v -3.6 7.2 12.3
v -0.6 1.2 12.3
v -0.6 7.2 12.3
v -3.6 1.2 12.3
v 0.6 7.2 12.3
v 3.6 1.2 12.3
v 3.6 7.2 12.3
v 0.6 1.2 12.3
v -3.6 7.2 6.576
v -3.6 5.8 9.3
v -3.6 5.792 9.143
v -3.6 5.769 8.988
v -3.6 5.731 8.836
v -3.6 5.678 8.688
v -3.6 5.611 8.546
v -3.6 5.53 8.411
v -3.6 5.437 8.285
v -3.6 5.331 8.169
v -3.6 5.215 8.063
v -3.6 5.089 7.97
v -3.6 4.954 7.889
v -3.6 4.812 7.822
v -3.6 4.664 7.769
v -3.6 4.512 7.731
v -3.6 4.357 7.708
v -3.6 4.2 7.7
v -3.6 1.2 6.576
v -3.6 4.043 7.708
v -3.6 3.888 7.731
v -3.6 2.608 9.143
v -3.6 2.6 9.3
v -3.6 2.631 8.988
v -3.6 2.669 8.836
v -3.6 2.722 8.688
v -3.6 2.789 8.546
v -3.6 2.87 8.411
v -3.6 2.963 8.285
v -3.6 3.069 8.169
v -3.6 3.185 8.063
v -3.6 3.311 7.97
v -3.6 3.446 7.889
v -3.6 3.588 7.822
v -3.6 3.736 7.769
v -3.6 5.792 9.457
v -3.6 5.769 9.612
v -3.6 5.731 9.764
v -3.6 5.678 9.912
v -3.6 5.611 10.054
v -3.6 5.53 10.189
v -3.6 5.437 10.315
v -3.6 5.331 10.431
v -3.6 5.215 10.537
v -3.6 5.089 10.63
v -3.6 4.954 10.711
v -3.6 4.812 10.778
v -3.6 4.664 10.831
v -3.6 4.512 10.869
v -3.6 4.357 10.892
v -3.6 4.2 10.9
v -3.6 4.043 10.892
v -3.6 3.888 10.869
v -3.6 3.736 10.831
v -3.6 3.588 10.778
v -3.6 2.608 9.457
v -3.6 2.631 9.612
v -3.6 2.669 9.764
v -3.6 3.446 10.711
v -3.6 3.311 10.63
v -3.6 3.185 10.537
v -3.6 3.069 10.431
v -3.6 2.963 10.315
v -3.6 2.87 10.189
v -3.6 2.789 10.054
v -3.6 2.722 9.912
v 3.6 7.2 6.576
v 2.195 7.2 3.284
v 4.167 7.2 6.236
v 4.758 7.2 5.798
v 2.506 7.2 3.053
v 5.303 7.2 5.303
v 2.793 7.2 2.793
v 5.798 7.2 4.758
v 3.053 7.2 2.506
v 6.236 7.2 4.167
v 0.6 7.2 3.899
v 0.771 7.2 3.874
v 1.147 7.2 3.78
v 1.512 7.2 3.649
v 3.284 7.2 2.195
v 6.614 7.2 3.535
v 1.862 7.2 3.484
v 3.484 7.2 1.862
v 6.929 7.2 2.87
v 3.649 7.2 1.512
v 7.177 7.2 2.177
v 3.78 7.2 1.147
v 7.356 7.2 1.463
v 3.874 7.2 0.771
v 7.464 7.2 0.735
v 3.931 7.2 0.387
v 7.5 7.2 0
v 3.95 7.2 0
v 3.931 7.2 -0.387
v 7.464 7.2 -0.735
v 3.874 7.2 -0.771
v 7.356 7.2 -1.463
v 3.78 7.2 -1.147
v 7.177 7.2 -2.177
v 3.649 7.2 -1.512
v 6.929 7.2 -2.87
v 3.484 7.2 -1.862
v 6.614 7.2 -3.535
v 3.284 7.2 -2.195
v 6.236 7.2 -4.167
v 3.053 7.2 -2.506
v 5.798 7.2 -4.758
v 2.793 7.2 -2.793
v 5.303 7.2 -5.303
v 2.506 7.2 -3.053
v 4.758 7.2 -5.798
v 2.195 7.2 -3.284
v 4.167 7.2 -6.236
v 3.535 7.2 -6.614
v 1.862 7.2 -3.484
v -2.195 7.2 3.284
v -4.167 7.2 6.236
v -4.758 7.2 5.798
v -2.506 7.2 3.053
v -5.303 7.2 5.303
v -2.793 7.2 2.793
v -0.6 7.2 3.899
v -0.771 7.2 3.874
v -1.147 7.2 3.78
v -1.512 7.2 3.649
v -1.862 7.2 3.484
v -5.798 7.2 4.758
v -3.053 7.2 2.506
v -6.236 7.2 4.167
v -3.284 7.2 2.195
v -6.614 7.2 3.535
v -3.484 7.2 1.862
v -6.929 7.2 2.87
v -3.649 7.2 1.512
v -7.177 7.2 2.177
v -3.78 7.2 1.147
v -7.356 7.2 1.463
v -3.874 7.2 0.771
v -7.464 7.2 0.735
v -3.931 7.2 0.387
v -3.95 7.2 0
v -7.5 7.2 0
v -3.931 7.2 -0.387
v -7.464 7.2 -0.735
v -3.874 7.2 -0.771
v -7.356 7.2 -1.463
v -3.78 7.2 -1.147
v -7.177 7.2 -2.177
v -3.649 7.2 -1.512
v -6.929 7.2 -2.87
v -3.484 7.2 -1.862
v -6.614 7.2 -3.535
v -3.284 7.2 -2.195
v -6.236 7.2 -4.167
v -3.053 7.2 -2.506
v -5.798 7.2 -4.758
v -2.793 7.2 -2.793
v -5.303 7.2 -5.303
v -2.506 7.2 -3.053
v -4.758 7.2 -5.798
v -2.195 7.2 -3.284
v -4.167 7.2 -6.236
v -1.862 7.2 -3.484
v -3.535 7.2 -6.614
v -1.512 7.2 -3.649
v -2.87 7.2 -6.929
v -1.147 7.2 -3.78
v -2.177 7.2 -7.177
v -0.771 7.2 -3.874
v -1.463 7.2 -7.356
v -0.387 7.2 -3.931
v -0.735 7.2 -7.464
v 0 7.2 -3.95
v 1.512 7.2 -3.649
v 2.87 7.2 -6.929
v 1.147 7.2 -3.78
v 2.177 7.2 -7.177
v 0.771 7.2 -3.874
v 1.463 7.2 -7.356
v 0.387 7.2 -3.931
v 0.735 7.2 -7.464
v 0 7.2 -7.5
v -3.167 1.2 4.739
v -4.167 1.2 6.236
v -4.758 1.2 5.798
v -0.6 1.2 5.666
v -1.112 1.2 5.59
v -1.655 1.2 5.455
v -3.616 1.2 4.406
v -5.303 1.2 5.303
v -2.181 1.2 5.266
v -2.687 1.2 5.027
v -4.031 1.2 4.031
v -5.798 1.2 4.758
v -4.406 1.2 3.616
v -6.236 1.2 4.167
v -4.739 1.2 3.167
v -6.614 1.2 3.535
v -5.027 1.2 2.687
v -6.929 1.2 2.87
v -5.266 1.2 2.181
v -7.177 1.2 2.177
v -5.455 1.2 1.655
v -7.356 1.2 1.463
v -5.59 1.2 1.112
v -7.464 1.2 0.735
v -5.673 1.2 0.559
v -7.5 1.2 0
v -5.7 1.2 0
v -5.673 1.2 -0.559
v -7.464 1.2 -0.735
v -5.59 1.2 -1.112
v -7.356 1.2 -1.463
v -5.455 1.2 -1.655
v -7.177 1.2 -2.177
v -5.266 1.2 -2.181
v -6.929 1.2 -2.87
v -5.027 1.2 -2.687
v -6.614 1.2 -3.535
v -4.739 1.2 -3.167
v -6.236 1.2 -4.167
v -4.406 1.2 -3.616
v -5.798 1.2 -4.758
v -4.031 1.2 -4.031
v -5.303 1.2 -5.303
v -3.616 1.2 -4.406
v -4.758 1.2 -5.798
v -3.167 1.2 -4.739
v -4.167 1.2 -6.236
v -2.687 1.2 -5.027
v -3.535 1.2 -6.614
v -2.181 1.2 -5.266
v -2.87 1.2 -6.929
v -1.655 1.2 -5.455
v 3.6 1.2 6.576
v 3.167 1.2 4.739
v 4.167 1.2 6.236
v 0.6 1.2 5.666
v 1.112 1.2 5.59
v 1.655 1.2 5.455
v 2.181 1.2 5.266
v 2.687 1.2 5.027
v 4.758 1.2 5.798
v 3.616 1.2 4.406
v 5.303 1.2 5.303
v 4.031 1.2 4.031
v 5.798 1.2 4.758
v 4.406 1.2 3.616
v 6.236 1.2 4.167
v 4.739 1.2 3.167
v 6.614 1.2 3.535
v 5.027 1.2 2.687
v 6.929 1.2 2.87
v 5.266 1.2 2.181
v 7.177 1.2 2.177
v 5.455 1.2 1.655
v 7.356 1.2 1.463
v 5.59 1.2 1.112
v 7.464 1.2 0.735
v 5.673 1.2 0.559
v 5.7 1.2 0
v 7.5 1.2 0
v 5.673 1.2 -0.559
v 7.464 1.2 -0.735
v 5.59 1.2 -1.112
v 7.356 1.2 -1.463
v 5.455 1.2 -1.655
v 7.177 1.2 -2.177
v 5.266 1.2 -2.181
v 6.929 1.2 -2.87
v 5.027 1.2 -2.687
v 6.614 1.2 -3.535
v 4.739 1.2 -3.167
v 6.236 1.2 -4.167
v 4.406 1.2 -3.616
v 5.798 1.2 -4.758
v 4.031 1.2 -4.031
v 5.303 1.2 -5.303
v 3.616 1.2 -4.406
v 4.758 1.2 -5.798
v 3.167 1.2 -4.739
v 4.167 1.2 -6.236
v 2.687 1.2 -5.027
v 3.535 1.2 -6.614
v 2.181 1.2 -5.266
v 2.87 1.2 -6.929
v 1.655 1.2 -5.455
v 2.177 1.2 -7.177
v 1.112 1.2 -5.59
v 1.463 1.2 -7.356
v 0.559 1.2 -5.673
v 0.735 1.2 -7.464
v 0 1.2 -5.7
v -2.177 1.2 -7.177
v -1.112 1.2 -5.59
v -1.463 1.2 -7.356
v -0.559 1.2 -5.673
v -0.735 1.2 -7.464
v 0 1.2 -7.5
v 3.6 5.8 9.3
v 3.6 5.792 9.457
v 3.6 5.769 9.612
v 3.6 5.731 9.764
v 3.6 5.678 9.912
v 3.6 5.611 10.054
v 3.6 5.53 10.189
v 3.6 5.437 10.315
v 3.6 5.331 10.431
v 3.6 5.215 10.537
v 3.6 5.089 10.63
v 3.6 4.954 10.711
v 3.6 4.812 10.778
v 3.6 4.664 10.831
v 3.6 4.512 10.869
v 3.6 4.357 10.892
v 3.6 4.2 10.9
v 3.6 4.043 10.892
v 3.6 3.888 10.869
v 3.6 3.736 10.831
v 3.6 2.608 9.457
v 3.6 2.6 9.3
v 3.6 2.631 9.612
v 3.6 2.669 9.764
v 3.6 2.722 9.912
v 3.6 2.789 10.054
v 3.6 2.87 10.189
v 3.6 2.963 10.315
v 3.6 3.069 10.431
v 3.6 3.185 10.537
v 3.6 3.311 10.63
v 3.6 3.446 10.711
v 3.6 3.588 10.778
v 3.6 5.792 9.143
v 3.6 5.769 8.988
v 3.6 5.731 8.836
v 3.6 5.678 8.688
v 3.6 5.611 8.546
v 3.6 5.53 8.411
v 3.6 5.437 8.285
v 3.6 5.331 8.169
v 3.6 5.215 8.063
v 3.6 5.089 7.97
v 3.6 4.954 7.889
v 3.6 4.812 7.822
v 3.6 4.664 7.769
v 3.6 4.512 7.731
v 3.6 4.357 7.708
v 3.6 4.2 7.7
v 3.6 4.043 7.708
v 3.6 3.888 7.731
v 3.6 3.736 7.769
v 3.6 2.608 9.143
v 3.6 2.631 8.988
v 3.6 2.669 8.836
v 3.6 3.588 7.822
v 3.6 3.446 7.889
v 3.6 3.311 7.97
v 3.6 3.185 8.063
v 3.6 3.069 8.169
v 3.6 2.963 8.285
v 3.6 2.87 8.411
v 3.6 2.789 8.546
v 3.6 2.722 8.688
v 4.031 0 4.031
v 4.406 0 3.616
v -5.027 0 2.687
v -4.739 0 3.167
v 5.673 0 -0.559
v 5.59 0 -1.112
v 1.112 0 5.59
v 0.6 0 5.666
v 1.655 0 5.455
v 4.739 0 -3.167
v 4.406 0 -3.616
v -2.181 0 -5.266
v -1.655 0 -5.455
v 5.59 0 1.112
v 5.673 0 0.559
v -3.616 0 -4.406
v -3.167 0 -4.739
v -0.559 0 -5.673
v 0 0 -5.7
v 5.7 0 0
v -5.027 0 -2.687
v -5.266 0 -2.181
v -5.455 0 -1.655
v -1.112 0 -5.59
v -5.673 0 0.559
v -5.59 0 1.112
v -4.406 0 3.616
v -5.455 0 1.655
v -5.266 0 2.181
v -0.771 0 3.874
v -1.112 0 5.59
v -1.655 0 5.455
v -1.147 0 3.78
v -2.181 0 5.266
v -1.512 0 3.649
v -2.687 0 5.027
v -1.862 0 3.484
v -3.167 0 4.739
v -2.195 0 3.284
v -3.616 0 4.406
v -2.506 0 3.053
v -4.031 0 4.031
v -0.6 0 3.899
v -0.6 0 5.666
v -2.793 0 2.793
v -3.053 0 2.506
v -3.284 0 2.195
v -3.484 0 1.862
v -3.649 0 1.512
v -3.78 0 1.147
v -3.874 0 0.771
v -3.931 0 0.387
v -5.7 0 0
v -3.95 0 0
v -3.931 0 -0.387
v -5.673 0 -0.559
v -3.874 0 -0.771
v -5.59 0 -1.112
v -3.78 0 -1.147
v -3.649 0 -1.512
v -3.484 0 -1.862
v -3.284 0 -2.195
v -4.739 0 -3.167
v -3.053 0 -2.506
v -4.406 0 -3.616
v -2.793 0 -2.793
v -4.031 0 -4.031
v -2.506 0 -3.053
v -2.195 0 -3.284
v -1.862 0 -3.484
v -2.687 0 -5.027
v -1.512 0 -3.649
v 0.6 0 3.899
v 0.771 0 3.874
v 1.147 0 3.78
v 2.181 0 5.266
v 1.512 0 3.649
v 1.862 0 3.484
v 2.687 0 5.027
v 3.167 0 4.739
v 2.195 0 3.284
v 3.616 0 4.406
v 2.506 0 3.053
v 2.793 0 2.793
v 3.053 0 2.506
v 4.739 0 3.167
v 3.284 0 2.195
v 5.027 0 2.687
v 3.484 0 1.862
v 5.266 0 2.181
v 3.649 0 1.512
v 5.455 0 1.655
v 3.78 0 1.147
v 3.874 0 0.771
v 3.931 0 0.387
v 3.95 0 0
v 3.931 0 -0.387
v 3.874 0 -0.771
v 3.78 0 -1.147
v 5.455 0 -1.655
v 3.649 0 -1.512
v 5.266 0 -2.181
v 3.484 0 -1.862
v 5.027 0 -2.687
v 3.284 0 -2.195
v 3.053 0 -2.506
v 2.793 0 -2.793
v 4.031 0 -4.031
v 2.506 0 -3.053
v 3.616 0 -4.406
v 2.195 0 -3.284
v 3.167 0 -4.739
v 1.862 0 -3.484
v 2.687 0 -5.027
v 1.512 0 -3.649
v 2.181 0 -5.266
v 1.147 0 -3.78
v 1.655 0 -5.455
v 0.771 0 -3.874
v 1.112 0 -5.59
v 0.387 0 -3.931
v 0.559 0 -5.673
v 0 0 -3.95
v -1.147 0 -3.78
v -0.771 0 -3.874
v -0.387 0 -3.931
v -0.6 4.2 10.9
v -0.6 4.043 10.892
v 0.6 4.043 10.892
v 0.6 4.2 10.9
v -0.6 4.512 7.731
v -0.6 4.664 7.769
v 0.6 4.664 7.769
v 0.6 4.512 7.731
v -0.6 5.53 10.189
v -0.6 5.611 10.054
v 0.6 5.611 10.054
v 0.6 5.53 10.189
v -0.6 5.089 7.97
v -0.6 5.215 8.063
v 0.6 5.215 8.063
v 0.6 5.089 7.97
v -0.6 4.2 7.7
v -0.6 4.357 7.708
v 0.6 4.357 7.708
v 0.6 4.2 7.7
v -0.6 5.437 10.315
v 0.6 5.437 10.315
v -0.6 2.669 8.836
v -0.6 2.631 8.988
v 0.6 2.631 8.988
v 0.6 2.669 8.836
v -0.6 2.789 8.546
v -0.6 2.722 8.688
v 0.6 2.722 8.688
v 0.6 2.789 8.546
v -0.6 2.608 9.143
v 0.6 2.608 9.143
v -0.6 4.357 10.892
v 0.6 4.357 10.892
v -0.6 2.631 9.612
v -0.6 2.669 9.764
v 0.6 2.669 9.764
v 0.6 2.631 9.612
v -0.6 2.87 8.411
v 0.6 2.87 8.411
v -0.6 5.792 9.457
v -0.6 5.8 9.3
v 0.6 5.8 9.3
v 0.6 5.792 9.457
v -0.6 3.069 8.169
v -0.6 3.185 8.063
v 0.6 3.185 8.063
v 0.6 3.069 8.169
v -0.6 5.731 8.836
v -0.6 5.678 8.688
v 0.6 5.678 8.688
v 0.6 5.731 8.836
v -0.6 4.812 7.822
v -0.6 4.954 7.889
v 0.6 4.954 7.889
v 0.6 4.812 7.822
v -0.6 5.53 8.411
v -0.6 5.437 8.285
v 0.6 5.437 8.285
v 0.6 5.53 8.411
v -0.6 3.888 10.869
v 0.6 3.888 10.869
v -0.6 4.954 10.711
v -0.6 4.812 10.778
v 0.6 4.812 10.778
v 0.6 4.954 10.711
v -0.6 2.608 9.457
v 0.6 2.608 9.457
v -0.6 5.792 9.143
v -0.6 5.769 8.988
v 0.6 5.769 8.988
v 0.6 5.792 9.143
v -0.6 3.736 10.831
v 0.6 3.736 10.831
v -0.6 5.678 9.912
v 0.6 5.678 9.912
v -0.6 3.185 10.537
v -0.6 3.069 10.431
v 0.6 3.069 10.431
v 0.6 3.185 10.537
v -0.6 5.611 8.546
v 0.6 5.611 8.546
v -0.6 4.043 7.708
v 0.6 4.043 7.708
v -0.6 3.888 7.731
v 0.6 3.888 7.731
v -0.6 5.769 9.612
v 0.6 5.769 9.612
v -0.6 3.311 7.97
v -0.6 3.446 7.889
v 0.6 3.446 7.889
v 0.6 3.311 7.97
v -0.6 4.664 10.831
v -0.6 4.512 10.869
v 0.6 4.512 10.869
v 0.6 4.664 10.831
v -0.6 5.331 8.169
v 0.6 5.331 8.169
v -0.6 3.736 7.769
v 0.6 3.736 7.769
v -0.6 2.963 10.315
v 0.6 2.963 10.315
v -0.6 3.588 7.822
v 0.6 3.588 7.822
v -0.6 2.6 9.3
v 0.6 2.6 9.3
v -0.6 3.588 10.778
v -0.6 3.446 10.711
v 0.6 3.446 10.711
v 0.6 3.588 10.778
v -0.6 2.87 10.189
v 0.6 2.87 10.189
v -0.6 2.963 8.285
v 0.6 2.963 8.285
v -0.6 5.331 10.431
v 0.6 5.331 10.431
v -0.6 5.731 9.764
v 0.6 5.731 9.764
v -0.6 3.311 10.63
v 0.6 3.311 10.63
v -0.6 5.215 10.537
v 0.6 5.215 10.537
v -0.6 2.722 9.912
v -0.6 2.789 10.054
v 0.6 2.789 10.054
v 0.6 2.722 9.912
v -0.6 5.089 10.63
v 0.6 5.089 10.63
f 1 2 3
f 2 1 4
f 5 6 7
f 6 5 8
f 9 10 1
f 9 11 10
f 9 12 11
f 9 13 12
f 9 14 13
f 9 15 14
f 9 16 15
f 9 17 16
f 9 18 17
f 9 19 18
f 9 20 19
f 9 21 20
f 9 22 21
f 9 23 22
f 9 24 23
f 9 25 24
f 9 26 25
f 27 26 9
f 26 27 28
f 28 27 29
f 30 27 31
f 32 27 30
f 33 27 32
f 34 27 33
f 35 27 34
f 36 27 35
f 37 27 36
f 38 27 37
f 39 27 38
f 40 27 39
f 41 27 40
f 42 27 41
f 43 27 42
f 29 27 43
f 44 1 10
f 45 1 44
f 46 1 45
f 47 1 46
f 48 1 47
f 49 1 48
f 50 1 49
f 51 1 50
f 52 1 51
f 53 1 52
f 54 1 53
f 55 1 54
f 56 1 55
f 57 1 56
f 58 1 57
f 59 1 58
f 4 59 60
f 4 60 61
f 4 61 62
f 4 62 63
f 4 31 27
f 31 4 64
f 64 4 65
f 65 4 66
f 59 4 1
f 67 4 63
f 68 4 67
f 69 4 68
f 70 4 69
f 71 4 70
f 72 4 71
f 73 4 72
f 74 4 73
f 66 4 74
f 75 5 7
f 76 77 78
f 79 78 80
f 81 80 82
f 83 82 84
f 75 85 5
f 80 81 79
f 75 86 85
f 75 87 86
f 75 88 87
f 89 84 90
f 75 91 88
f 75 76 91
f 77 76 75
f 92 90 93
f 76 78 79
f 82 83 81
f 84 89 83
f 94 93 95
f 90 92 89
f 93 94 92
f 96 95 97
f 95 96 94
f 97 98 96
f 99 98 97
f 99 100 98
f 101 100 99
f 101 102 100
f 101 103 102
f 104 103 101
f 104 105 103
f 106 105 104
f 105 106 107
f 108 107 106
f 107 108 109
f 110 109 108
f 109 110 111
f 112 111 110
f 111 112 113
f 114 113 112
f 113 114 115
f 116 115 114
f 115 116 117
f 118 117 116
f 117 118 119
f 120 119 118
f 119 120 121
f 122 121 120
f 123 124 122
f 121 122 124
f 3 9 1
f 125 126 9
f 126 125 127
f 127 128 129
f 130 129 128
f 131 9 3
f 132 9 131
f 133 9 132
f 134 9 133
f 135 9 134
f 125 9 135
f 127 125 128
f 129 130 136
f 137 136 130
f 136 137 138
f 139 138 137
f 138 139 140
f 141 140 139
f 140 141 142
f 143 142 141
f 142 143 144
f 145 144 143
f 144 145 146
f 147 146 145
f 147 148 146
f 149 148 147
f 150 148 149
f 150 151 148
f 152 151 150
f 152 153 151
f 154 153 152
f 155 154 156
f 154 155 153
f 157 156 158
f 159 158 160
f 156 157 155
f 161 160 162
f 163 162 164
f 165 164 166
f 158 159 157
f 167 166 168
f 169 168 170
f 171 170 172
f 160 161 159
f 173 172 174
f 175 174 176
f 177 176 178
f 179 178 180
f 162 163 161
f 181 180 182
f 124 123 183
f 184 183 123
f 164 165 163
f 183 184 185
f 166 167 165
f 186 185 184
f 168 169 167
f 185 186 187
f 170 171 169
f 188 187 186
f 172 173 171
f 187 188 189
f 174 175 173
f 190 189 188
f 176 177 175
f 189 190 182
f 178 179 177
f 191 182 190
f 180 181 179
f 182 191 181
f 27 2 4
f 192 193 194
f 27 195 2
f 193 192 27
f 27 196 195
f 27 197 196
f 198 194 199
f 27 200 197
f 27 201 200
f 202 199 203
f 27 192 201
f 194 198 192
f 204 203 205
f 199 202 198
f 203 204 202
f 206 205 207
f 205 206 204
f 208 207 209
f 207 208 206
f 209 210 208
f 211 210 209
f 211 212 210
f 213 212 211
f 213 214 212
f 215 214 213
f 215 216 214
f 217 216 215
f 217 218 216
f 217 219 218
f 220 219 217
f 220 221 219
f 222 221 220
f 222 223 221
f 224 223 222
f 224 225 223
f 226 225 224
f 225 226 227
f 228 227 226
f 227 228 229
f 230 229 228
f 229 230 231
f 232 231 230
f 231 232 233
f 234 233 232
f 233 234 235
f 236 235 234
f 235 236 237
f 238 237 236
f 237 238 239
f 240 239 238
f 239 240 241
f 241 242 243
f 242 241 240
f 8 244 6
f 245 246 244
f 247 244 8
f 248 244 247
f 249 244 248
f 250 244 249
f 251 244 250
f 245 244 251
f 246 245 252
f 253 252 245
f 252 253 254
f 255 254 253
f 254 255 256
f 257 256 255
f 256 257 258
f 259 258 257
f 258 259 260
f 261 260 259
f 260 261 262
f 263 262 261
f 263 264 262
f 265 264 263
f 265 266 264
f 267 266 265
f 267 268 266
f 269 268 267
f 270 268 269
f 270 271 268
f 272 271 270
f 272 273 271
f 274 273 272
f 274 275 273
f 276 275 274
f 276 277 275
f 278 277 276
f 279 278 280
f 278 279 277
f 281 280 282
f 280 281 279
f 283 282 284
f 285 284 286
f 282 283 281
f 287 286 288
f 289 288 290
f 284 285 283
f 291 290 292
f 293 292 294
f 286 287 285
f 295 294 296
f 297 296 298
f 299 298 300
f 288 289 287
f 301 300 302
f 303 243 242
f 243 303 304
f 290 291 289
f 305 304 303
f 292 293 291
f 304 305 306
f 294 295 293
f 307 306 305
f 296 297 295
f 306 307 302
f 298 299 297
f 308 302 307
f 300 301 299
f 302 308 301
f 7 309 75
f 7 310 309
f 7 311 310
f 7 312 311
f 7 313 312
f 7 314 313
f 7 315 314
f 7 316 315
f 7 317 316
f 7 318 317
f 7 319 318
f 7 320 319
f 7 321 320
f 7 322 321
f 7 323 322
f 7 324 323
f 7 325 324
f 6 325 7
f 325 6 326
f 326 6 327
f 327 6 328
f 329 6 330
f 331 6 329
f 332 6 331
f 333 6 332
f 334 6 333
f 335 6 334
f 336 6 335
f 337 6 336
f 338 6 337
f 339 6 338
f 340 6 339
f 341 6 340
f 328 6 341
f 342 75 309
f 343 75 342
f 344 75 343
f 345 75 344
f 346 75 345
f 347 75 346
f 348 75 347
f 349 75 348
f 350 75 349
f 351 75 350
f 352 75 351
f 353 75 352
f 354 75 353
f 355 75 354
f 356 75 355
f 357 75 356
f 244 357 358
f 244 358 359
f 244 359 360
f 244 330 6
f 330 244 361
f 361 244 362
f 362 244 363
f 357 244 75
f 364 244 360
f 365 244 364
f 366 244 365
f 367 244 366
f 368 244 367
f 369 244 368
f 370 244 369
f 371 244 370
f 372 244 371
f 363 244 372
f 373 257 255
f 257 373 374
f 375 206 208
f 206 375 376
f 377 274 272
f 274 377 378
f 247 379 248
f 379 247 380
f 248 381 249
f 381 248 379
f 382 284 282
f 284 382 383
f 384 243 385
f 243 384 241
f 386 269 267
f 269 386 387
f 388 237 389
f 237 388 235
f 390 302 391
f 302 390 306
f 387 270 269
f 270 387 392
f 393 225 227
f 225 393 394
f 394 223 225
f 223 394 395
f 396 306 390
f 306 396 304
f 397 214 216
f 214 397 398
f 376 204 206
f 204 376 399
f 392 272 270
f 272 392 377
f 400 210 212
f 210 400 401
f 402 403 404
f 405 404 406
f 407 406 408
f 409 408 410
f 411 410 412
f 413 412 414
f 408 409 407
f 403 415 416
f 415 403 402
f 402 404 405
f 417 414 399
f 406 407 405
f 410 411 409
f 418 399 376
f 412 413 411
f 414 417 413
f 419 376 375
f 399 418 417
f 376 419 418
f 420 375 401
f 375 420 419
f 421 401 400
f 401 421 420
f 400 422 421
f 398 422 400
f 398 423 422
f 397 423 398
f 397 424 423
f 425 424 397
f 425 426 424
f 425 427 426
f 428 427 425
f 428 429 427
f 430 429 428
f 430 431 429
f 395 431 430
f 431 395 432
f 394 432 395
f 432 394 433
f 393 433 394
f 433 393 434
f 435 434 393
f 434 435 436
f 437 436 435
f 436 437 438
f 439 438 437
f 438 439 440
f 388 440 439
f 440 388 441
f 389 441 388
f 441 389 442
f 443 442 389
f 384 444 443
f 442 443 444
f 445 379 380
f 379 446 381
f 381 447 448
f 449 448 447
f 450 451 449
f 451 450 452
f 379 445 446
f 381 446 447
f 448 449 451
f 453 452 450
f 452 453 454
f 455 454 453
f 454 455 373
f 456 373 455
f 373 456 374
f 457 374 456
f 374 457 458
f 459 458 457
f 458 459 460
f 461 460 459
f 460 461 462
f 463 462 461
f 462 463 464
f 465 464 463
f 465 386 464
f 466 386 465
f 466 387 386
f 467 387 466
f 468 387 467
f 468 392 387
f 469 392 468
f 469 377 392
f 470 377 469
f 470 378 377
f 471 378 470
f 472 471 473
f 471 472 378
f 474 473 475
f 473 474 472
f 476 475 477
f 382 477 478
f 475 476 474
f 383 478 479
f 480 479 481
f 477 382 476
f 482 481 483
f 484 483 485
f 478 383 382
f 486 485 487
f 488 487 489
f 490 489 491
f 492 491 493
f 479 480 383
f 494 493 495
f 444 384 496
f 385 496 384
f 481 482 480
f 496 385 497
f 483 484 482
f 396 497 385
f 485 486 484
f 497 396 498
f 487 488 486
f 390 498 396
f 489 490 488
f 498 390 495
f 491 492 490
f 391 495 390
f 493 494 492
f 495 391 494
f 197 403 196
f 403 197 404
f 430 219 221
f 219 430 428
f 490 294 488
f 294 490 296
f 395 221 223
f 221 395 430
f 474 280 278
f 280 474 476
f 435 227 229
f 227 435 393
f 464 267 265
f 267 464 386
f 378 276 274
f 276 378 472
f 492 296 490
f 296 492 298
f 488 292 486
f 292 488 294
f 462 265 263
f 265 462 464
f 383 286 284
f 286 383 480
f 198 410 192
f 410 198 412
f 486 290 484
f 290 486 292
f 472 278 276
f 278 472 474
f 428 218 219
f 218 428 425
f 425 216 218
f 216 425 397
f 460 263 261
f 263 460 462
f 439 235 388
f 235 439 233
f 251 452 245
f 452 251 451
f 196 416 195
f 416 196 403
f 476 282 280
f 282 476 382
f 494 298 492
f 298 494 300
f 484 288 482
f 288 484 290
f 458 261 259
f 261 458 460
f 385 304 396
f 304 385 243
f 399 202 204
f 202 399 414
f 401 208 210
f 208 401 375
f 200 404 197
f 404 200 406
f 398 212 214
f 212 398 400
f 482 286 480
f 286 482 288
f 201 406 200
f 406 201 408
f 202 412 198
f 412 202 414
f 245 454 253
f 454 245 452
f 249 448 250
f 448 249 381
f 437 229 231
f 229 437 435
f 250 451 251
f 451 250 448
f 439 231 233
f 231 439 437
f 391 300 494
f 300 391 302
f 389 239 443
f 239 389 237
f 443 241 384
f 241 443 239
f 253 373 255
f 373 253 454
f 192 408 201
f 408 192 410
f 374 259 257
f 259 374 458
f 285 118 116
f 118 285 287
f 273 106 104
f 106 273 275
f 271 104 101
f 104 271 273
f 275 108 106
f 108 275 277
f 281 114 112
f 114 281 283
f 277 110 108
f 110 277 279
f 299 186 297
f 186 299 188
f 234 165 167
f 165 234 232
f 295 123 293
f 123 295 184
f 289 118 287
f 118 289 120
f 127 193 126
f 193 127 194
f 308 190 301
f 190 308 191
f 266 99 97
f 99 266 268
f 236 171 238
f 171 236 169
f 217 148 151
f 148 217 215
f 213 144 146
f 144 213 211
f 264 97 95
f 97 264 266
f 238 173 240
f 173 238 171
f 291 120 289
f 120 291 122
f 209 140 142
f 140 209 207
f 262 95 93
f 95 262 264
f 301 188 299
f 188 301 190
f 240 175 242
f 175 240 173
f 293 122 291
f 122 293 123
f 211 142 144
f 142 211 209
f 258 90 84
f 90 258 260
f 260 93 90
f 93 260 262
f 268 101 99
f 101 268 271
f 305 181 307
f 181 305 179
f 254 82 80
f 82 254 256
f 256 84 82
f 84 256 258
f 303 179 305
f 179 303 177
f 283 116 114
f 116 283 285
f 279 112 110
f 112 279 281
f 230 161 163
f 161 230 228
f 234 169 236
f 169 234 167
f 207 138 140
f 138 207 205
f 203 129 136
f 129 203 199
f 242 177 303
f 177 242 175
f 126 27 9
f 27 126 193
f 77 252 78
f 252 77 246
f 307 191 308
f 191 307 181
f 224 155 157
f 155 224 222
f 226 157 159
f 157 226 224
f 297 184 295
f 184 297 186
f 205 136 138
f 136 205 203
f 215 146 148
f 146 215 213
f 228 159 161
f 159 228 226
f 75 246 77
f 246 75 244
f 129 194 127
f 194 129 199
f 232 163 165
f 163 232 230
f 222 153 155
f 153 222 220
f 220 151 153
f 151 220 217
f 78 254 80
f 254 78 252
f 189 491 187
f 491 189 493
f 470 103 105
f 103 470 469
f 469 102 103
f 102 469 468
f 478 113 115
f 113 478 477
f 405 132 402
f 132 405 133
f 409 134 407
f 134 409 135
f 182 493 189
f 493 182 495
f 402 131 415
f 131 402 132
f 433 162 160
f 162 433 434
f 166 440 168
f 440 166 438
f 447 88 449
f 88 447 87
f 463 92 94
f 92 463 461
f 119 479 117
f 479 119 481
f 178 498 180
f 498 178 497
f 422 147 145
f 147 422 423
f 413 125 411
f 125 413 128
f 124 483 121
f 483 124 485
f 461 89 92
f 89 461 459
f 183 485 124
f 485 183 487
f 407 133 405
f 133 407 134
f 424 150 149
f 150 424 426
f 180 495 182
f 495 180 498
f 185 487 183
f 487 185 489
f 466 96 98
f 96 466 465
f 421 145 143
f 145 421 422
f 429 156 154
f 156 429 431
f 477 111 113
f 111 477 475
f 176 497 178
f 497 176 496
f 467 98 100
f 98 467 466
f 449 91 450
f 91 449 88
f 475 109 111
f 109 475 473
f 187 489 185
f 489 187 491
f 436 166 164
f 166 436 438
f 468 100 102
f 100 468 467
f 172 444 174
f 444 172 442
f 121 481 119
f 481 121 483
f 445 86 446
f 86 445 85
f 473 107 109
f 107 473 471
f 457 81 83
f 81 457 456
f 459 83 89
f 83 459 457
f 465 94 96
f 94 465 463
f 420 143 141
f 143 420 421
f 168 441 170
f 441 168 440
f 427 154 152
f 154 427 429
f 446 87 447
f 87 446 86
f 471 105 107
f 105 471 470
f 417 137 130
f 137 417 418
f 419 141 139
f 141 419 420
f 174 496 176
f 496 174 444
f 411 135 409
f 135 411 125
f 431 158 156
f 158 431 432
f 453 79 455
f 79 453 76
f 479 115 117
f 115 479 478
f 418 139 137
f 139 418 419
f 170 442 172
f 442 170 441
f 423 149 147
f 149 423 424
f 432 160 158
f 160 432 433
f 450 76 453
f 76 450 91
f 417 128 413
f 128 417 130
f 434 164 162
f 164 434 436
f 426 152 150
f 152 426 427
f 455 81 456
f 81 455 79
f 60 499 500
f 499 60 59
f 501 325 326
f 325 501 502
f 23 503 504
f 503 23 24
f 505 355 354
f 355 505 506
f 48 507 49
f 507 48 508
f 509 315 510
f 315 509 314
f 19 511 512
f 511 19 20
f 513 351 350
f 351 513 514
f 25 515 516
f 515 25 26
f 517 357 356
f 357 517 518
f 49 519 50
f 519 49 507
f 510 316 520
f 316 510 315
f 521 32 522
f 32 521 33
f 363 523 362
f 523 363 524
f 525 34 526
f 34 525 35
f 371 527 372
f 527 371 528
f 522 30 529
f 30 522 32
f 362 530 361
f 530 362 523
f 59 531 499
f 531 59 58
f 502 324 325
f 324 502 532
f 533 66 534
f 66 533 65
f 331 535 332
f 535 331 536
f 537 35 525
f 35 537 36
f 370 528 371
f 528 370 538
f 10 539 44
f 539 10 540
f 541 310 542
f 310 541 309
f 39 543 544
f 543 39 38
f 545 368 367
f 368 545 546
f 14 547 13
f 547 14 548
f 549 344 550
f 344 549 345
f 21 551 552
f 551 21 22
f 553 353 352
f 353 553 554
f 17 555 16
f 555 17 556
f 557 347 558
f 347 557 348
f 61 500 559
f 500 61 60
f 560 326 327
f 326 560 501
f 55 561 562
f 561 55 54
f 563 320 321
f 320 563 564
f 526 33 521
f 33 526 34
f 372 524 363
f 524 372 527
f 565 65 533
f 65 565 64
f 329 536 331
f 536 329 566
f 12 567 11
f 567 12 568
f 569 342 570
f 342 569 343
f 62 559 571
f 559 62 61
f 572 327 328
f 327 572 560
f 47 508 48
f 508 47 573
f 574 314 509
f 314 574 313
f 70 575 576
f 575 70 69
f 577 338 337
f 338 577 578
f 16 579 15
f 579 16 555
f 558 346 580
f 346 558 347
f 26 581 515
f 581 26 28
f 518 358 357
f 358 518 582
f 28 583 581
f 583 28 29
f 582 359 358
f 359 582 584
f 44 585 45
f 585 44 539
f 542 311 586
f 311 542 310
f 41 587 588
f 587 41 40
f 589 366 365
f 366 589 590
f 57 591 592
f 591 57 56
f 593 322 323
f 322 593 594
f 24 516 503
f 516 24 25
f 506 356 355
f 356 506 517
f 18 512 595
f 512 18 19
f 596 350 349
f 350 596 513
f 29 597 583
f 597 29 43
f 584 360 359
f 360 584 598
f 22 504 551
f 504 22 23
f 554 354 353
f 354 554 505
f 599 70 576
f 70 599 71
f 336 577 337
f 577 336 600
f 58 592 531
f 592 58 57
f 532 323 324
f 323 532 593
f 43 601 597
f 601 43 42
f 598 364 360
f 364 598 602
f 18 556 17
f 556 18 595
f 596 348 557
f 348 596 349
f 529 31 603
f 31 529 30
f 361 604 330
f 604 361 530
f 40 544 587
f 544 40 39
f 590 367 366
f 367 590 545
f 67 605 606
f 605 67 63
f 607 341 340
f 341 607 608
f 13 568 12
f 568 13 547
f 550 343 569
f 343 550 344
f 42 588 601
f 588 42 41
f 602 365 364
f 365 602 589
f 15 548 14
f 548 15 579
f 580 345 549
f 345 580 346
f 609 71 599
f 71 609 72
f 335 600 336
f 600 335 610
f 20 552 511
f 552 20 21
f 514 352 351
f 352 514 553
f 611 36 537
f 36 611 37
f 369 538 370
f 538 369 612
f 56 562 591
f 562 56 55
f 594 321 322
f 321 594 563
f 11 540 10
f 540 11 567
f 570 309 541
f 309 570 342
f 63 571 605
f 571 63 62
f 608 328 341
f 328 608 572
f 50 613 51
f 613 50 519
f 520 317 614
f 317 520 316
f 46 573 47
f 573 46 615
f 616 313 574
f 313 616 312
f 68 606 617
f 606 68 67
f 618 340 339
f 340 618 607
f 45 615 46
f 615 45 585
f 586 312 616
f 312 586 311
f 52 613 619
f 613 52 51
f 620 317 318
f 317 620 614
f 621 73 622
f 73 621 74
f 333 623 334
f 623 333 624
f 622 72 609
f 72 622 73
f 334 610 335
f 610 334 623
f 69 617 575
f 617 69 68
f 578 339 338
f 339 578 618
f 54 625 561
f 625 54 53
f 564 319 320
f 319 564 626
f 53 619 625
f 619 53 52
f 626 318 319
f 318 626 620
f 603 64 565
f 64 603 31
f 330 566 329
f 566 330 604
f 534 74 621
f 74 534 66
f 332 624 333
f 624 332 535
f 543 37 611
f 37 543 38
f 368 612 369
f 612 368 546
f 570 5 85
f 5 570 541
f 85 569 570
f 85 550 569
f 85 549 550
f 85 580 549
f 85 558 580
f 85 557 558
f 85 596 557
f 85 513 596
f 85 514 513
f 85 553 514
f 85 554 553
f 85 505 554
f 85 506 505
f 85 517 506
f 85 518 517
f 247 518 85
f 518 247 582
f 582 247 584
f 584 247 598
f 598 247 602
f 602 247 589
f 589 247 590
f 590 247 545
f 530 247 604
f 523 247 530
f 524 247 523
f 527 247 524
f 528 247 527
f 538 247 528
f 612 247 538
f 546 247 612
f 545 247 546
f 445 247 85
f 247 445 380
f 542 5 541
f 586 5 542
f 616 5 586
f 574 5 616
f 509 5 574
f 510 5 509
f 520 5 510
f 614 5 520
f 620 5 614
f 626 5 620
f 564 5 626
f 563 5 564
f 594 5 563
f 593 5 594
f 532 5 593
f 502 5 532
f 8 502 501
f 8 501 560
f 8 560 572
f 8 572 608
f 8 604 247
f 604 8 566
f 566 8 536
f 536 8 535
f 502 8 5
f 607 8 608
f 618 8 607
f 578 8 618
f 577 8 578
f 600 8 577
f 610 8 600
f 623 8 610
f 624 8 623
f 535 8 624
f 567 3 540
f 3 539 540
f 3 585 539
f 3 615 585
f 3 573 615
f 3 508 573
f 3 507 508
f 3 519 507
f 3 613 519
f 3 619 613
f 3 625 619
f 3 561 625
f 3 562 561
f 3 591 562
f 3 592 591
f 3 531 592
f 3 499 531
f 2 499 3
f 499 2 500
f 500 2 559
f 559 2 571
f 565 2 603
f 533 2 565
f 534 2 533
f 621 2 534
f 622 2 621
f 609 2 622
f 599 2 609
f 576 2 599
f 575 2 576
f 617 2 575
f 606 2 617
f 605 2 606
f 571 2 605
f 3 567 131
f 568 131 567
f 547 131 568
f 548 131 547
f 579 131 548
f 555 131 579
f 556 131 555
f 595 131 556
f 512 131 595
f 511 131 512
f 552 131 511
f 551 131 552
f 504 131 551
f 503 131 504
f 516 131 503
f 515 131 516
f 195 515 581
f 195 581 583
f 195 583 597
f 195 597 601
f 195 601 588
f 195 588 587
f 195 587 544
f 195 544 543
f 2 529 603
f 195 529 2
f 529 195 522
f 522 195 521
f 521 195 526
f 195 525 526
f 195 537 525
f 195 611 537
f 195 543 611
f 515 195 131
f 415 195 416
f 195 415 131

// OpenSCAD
// Standalone lock collar part.
// Edit shared dimensions in frame_v3.scad so the assembly and this part stay linked.

part_mode = "lock_collar";
collar_dir = 1;            // flip to -1 only for mirrored preview
print_export = true;       // use high quality $fn for STL export

include <frame_master.scad>
